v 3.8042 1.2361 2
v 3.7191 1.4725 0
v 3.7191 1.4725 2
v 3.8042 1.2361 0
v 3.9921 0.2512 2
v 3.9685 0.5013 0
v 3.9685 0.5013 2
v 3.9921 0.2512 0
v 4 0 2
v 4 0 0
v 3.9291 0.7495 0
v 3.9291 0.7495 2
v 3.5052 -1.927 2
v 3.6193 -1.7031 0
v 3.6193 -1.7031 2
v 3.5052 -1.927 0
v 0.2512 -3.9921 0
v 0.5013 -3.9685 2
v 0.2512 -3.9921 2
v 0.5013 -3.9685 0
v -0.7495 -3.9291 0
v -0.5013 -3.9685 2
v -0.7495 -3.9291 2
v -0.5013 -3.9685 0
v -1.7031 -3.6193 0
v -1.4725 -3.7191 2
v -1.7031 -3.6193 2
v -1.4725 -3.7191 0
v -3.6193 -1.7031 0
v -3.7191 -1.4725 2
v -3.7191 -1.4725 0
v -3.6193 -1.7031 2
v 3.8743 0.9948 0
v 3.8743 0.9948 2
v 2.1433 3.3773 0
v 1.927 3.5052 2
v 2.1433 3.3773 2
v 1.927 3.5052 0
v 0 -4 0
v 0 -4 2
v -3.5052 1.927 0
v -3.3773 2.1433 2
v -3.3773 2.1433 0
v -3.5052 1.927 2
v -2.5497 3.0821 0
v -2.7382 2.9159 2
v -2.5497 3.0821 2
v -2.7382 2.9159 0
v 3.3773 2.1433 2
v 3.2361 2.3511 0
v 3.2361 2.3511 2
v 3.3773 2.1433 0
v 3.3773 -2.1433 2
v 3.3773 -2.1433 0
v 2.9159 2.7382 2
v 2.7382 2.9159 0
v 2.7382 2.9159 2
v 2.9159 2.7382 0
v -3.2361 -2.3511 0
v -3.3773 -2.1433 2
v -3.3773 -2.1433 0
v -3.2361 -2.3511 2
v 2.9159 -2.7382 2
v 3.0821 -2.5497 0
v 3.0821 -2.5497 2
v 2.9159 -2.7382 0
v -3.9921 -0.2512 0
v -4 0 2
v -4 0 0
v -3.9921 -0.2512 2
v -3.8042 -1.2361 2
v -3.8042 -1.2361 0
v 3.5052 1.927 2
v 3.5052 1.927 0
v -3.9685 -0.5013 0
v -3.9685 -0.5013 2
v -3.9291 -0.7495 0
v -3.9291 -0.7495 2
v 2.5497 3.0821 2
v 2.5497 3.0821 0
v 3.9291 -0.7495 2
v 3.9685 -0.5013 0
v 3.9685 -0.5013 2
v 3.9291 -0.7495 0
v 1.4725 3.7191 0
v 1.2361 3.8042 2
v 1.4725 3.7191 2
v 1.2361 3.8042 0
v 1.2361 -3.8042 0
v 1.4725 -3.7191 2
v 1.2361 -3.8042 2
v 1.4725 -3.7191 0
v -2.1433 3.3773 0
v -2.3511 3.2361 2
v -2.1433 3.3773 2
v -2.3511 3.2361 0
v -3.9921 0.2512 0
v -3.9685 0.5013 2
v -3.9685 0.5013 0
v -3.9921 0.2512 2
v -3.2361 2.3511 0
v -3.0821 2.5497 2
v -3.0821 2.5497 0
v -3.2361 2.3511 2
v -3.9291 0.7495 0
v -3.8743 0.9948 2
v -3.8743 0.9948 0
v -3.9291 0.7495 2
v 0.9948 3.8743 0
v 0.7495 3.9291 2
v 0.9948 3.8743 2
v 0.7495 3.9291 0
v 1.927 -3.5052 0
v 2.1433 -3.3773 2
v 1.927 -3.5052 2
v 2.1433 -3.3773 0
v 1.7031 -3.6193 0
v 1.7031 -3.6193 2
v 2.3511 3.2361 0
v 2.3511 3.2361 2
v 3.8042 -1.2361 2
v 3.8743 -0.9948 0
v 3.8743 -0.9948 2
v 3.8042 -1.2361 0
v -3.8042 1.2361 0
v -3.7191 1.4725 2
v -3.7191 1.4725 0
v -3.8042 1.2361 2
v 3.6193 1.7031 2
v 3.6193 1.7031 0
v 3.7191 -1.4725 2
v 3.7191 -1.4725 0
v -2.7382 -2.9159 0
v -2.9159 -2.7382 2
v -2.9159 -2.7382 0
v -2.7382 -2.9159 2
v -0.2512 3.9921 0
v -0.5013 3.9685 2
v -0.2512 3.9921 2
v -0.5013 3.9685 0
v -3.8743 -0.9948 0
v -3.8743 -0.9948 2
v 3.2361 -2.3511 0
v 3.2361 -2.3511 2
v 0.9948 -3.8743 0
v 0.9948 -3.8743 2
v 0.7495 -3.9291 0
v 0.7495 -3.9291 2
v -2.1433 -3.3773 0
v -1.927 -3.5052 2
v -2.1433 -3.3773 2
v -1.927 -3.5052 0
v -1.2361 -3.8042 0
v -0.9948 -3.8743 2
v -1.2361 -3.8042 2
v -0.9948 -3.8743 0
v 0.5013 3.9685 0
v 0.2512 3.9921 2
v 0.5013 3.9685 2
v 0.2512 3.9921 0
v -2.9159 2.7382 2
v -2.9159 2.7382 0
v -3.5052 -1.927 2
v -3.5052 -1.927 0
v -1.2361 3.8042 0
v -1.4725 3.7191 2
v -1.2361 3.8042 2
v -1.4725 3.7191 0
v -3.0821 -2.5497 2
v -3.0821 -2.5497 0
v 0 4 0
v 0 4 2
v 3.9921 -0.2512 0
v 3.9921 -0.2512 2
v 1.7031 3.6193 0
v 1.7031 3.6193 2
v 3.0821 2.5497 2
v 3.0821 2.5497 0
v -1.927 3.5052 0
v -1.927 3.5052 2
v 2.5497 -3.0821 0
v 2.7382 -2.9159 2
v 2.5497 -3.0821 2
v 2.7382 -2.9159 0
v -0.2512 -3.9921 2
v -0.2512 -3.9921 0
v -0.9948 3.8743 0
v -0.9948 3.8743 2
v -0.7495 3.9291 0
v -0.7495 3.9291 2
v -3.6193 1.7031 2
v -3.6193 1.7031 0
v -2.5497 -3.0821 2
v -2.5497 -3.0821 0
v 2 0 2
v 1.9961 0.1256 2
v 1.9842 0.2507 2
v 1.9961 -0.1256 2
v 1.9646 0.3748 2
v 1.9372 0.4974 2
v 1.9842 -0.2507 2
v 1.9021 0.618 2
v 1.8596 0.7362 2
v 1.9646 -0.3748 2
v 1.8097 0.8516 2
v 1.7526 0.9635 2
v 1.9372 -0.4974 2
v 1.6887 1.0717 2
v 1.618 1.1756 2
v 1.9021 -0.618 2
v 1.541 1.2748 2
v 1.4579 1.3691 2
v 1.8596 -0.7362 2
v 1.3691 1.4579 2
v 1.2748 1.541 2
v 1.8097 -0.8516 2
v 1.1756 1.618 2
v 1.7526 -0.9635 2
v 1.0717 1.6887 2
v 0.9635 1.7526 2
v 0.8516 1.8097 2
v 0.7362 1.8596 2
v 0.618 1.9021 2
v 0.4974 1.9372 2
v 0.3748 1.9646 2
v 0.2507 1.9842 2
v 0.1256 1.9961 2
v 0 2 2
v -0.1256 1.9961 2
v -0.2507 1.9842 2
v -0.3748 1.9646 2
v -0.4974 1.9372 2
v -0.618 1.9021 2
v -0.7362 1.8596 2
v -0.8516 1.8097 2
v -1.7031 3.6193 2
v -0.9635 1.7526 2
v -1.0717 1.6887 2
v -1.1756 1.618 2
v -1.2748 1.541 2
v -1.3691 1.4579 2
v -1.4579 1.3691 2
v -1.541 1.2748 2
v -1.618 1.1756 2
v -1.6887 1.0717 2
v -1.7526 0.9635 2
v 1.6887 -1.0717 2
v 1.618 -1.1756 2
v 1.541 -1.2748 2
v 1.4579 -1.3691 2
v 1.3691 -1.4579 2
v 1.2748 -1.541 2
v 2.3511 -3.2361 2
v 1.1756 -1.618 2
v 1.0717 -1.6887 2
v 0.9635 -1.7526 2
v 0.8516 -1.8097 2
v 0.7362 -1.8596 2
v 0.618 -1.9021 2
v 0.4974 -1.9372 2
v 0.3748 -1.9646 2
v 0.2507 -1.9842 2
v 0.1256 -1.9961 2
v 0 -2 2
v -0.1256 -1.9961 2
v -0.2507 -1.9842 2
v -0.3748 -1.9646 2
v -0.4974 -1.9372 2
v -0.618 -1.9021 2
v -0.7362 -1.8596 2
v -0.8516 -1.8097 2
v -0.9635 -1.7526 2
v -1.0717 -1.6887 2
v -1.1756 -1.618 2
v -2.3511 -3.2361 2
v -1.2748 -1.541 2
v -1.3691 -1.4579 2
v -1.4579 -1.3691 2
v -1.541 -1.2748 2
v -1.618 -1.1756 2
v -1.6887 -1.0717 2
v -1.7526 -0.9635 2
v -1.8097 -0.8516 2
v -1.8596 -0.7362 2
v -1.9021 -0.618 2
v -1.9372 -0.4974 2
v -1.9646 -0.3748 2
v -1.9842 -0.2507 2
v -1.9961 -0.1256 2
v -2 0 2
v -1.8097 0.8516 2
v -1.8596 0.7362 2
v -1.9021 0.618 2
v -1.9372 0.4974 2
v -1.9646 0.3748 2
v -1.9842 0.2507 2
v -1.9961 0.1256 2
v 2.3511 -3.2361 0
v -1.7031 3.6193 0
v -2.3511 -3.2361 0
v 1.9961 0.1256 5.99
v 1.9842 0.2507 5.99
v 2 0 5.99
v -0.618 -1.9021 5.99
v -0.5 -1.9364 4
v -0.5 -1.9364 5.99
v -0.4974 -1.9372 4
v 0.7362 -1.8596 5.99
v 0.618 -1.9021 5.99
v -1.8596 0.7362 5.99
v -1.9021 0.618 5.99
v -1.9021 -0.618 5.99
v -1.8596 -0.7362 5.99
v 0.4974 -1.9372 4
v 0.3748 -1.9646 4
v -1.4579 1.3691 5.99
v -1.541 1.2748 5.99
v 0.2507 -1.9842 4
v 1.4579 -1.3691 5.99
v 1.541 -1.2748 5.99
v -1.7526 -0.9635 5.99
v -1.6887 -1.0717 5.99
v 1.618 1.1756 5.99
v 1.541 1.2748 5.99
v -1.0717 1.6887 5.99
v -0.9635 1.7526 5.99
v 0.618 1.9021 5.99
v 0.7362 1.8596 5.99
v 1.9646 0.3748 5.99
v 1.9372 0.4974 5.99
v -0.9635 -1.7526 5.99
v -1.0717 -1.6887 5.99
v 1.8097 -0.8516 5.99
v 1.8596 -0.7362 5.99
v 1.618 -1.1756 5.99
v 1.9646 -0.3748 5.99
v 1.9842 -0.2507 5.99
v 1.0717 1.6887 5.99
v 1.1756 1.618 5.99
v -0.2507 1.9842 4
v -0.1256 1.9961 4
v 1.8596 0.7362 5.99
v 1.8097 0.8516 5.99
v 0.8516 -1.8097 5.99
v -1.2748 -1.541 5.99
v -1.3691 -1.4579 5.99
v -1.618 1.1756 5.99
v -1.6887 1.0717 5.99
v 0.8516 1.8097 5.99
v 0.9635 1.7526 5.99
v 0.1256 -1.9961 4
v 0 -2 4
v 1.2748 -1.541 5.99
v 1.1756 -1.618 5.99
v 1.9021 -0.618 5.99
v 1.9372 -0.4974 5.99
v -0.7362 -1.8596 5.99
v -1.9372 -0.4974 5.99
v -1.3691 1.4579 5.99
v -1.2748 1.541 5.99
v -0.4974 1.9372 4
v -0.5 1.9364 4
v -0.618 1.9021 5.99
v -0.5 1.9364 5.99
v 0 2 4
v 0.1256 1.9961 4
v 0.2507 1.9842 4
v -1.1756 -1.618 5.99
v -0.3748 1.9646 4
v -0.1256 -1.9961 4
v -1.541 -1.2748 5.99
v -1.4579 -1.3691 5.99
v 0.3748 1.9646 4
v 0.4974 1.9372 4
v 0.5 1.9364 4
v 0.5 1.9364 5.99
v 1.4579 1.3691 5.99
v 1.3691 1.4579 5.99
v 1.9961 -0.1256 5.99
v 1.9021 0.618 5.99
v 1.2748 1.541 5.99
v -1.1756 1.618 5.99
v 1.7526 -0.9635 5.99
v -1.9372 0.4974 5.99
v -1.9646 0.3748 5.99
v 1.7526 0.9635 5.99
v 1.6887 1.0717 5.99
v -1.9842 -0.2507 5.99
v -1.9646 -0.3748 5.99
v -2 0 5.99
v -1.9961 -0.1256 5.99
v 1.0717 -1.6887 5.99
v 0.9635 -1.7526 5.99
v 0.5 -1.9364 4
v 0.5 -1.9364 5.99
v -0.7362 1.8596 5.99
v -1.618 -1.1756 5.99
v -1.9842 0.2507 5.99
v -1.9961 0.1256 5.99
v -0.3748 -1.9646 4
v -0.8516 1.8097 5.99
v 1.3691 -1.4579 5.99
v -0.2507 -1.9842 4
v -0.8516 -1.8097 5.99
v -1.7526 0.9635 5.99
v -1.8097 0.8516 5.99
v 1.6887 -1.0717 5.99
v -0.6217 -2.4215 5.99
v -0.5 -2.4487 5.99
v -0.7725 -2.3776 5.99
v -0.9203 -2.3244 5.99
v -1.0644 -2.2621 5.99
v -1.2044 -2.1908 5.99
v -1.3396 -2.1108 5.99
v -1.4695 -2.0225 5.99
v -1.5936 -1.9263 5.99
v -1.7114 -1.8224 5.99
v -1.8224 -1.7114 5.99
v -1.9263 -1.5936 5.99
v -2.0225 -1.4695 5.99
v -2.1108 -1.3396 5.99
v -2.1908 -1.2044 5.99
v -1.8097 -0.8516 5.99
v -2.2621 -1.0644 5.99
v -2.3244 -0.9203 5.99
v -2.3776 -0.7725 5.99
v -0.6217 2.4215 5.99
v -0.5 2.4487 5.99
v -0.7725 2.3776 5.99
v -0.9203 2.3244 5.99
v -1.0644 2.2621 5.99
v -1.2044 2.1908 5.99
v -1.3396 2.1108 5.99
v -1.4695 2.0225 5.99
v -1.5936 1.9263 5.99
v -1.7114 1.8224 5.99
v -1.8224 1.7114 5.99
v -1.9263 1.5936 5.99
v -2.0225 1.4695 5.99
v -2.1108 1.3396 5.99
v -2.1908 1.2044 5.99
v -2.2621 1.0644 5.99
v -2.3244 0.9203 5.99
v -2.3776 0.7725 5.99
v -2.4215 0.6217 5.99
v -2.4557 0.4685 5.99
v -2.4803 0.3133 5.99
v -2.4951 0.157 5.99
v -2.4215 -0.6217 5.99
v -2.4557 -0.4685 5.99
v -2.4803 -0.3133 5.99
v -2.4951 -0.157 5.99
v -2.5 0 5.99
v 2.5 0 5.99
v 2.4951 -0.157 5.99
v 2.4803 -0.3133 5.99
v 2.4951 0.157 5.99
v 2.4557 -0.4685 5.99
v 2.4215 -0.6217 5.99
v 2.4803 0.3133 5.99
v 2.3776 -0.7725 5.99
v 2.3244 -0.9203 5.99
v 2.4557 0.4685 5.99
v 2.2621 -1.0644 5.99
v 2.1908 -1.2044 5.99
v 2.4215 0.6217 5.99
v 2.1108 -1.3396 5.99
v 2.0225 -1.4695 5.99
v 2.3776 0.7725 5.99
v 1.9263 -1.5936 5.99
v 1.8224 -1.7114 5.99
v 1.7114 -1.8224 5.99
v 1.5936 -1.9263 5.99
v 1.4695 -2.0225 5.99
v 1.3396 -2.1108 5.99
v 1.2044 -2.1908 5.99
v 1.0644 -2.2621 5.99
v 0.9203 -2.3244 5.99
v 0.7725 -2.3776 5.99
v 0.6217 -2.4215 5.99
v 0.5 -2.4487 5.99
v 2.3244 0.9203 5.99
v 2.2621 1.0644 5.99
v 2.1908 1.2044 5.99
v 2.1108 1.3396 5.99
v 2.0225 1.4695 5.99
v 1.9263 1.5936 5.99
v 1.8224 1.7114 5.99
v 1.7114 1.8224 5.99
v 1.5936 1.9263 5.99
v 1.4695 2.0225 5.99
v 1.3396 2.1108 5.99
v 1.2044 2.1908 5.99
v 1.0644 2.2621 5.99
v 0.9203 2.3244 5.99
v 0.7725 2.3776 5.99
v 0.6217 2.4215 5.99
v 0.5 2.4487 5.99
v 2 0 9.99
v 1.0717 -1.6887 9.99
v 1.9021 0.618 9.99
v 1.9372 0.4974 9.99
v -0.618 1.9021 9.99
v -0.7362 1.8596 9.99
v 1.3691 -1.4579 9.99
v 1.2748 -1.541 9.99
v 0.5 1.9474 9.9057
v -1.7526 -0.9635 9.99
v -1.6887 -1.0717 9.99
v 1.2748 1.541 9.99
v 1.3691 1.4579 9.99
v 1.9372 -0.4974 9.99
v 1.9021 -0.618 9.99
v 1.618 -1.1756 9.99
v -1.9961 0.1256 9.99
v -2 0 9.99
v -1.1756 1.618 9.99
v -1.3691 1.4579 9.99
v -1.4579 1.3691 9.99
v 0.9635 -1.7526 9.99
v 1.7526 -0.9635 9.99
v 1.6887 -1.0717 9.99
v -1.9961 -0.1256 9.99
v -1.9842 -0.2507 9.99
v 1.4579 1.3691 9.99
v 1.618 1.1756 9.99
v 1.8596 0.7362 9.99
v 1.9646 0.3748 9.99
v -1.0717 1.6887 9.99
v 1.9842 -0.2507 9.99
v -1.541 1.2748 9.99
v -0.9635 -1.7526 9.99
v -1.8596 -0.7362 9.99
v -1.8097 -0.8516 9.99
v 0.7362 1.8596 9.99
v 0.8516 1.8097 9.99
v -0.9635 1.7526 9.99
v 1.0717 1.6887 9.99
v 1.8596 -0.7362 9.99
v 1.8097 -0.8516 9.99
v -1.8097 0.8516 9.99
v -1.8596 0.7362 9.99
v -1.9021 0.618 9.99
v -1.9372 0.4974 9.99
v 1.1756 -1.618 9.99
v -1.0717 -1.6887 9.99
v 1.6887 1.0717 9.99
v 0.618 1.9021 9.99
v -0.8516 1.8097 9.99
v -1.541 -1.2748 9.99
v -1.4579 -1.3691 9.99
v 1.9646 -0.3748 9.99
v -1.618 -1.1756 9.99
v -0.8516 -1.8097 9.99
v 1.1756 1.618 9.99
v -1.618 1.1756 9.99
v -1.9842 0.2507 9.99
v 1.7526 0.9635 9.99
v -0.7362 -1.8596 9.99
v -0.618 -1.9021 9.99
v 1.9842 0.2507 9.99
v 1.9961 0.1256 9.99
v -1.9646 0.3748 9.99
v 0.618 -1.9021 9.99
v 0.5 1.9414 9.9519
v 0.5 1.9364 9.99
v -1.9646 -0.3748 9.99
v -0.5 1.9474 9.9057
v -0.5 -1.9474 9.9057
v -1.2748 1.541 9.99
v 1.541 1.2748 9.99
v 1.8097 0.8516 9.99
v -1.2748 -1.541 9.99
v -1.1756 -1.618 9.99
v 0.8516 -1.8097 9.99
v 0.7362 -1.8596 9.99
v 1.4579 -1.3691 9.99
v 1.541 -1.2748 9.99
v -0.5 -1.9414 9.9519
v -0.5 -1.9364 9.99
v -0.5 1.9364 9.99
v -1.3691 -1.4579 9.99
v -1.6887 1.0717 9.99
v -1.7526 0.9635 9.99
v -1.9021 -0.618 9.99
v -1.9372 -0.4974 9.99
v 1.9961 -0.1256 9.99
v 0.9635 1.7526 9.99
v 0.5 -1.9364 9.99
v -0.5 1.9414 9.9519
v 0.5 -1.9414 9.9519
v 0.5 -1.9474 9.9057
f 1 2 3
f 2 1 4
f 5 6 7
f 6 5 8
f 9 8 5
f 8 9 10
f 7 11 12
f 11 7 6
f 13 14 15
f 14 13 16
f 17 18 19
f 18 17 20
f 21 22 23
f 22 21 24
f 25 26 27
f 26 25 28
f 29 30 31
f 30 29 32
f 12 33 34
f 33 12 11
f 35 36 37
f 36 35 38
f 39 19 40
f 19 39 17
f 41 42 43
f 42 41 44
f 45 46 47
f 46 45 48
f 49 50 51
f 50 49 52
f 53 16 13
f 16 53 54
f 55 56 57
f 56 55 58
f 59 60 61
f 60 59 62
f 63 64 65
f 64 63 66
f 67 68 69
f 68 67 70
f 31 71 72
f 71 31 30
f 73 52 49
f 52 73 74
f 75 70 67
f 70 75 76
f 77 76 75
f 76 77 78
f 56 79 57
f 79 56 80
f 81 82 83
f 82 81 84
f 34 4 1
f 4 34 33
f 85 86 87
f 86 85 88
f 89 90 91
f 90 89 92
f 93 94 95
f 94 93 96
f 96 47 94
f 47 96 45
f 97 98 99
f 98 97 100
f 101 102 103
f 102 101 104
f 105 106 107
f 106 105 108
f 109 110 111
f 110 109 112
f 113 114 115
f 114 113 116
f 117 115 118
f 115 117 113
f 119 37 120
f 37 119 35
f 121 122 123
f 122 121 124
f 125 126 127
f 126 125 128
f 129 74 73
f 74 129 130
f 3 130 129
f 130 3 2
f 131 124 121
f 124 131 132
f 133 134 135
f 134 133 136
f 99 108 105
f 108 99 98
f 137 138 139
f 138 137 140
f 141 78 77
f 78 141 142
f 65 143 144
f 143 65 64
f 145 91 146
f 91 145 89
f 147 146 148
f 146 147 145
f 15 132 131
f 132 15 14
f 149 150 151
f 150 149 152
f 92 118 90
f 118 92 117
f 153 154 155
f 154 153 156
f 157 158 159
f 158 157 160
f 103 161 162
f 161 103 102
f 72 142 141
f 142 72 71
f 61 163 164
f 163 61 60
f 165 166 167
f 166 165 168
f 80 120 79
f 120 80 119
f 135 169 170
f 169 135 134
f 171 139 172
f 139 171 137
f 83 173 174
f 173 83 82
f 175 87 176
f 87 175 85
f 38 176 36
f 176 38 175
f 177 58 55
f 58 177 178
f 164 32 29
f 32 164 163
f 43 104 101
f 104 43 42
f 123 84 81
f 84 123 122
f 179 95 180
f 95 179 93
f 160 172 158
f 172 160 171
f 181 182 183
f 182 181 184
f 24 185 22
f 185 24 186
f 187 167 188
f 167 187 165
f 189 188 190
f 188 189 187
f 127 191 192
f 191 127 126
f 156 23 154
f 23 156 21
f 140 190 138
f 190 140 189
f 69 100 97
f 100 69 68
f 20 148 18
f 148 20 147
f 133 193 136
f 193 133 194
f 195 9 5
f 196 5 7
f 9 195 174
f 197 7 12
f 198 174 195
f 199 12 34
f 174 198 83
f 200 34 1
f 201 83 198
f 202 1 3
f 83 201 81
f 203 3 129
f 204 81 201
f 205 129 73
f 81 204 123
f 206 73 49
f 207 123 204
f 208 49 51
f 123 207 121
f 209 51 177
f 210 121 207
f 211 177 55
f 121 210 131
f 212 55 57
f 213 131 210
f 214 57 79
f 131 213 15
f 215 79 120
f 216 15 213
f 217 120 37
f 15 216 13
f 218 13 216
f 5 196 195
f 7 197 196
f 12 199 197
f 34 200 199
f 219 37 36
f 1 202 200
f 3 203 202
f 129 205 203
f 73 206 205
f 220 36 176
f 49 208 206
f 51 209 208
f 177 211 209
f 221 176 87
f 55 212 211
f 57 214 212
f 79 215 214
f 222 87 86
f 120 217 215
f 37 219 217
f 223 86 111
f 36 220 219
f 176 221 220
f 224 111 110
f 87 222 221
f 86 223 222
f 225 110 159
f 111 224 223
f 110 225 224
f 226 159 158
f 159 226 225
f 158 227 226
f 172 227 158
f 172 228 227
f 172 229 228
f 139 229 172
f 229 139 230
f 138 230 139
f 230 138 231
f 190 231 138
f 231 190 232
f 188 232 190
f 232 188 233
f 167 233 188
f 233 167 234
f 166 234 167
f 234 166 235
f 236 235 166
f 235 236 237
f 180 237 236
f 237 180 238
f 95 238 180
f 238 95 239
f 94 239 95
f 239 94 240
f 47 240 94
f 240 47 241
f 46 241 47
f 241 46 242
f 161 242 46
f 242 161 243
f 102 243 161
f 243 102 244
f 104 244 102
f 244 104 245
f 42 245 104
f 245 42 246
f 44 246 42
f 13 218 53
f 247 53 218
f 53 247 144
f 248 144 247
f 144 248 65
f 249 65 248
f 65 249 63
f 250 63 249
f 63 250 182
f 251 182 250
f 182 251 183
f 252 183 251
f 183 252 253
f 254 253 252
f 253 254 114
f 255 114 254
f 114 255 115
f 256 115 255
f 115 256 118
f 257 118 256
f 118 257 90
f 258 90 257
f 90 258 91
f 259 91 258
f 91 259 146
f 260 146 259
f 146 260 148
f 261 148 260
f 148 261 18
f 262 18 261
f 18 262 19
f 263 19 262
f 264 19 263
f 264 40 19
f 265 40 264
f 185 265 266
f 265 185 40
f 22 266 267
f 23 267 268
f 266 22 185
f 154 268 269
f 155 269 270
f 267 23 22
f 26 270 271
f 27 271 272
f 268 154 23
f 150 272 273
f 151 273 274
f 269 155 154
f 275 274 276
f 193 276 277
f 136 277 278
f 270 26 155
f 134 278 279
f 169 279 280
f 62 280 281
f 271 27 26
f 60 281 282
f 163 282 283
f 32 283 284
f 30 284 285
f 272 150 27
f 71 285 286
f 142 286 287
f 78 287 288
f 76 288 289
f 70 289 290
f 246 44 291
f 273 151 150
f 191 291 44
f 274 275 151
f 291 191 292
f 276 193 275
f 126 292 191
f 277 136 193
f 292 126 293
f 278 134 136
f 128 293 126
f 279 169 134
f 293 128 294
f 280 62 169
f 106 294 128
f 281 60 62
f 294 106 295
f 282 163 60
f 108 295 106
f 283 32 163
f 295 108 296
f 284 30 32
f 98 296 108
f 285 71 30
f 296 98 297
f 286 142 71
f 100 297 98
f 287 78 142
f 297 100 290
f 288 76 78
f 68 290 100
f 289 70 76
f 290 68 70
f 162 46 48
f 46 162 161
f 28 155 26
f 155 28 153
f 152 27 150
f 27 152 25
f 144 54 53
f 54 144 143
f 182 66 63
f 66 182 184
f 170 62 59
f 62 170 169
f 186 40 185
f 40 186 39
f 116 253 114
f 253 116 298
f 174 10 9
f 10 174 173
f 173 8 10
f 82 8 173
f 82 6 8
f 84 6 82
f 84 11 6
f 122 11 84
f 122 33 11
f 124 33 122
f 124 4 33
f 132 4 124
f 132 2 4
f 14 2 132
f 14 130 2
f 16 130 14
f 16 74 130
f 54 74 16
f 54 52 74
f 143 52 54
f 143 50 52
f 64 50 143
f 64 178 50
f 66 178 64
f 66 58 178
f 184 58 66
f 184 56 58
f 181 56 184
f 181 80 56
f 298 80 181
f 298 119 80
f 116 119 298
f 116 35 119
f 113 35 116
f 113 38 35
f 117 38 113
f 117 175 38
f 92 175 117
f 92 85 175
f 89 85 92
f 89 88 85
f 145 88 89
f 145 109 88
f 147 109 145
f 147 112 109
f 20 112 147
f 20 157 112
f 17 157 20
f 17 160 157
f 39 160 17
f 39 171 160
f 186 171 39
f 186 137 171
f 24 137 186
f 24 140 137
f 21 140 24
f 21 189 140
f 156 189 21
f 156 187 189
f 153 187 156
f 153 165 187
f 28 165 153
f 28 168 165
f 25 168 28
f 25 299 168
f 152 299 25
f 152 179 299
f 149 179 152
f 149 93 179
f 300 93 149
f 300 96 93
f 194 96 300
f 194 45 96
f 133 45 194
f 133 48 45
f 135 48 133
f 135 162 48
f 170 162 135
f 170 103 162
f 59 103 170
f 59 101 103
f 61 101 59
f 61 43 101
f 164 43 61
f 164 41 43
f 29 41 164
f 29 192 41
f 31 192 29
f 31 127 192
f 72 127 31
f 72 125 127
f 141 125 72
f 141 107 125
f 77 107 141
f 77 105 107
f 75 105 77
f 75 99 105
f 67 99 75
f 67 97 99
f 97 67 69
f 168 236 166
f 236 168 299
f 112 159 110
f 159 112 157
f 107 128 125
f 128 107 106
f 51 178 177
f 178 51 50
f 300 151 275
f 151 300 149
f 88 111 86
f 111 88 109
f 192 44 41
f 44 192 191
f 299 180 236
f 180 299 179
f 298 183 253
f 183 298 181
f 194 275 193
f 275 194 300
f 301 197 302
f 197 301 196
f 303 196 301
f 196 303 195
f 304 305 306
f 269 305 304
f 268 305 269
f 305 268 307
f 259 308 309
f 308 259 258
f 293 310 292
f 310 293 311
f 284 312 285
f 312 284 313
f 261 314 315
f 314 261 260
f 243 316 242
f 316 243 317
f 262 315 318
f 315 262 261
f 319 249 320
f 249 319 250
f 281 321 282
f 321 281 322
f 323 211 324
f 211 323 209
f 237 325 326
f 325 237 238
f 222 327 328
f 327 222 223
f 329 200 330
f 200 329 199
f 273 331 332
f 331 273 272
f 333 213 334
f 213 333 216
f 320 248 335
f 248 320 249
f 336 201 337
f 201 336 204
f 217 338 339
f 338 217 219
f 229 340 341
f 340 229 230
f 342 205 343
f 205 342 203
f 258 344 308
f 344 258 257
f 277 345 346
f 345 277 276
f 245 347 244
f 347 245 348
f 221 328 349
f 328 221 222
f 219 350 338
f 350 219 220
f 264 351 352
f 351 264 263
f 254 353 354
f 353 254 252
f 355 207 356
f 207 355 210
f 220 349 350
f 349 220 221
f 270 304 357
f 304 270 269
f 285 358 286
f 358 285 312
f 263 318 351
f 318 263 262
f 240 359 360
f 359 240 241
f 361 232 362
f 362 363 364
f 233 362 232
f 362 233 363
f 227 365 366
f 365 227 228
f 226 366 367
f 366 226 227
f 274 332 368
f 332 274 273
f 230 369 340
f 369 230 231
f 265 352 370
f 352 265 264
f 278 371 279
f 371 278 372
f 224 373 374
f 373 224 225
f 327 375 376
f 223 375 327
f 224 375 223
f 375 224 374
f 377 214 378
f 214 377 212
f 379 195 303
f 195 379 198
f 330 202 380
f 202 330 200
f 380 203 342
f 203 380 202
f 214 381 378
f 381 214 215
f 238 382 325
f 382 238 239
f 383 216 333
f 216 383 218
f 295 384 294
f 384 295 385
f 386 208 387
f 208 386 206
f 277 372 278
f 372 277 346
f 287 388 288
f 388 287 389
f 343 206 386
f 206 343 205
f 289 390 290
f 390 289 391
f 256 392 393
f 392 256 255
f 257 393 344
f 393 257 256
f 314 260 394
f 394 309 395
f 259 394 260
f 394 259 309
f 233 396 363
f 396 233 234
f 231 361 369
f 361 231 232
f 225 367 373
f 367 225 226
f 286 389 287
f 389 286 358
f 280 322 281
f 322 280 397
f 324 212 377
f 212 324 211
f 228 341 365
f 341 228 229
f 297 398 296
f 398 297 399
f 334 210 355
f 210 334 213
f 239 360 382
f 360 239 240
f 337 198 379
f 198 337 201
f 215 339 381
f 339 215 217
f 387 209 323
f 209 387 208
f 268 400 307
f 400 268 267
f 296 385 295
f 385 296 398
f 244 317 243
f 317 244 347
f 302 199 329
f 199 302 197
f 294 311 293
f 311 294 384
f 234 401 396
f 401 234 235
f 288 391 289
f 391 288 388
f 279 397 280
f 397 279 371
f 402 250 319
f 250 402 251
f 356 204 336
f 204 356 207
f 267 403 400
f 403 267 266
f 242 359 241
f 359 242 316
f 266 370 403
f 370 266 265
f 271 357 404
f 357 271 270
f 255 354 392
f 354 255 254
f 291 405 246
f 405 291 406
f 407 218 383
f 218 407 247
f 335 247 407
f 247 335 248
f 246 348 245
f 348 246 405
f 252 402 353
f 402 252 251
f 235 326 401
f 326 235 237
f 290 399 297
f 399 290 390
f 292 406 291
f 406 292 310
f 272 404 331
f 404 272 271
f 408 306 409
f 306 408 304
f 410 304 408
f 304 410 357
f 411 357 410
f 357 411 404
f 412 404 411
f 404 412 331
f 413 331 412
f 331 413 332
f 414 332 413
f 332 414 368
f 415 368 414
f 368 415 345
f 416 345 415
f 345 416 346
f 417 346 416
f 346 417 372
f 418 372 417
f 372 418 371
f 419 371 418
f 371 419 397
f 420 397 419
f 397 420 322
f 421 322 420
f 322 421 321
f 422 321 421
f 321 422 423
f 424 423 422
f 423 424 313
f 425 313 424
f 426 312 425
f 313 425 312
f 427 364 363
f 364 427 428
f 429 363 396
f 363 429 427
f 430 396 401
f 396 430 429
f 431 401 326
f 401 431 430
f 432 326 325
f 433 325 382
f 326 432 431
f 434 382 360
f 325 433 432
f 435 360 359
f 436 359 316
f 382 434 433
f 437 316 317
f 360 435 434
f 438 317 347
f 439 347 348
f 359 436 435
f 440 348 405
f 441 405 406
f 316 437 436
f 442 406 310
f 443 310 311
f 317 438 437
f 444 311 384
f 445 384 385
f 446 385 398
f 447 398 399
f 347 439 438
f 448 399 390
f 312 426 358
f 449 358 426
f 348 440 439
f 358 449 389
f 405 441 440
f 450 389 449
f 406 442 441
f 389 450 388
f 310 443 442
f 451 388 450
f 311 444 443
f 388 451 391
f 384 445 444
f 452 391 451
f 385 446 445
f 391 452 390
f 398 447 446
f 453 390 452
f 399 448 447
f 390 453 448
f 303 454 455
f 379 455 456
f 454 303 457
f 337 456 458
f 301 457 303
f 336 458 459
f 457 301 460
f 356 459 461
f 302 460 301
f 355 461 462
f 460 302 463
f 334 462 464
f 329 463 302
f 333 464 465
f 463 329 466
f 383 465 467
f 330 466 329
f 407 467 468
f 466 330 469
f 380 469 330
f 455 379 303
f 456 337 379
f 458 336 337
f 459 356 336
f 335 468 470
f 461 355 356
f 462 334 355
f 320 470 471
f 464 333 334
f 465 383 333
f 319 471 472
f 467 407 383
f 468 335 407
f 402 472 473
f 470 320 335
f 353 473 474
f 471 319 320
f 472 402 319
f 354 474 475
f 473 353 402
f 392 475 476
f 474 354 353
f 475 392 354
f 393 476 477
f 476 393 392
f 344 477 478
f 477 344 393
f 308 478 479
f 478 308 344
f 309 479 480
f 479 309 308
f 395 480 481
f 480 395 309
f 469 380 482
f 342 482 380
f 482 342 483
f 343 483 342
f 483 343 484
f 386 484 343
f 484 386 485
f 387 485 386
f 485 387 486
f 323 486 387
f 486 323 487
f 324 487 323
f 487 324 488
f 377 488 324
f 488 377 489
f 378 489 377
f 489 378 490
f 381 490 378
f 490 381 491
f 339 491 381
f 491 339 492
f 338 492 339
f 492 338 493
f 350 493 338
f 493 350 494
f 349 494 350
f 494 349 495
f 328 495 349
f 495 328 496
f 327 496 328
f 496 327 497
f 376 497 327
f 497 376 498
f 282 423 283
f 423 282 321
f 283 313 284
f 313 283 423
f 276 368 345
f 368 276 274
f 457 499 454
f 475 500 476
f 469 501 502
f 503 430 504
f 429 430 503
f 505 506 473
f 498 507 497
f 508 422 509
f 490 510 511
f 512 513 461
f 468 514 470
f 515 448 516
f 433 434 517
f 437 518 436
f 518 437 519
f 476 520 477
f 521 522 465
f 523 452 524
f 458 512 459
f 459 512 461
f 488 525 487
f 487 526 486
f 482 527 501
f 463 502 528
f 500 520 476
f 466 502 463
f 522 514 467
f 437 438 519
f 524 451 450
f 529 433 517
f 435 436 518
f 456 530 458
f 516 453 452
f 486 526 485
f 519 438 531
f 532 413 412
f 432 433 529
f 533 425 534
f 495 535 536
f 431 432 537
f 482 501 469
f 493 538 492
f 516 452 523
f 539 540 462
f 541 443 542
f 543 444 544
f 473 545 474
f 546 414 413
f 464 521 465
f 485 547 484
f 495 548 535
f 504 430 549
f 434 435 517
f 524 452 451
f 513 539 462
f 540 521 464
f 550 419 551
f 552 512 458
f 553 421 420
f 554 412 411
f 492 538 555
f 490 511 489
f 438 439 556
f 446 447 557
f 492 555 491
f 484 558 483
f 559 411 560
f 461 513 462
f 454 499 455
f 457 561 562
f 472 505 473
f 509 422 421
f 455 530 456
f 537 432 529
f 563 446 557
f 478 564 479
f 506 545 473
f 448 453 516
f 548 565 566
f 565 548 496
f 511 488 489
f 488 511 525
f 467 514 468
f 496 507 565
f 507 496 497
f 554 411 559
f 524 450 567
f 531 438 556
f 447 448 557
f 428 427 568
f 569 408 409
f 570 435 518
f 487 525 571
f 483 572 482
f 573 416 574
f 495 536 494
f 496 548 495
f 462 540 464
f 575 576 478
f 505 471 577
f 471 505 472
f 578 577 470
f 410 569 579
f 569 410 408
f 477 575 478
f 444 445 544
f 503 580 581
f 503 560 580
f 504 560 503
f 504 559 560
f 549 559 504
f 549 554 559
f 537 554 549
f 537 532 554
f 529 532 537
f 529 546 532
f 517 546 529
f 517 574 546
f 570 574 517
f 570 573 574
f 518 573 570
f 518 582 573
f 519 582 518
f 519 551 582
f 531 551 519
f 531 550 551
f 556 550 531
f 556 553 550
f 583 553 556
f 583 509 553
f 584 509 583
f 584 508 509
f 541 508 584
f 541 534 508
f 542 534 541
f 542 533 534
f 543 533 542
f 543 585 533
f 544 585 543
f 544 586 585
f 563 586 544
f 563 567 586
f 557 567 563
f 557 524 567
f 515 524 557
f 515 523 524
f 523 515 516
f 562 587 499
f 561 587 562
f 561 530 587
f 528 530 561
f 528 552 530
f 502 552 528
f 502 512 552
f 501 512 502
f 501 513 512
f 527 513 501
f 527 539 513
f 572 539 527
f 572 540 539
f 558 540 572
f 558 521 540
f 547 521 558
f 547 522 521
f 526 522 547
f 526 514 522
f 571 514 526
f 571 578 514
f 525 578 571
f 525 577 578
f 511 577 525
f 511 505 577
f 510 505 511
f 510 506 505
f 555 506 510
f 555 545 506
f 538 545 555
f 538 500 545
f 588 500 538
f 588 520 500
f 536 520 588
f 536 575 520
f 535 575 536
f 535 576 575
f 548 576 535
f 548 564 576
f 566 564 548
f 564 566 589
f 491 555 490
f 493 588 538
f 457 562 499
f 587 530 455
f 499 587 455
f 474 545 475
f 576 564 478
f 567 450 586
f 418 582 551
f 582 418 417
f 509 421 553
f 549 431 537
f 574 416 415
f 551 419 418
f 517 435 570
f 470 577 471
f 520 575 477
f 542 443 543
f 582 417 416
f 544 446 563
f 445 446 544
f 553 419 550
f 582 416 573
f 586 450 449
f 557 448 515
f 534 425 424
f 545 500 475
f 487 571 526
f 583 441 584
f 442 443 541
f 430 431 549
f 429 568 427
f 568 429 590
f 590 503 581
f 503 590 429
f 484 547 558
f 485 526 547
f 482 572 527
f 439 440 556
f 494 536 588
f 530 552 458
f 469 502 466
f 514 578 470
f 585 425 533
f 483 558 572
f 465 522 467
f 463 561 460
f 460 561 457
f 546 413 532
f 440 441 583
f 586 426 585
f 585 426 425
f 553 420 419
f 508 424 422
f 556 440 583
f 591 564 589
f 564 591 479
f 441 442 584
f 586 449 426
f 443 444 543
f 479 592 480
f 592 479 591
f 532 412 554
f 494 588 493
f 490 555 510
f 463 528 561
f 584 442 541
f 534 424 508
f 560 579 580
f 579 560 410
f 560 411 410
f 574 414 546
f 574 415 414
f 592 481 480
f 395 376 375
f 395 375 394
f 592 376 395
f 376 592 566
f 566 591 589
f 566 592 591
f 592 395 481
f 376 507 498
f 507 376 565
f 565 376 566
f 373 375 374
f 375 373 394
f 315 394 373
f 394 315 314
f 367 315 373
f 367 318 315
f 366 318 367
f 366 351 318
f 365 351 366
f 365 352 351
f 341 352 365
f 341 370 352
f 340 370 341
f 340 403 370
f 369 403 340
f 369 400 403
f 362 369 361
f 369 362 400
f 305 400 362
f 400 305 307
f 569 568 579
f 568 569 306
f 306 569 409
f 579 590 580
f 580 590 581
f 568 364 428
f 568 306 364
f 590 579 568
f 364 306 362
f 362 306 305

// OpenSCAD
// rivet.scad Customizable plastic rivet

$fn = 100;

/* Rivet dimensions */
Base_Dia      = 8;
Base_Length   = 2;

Shaft_Dia     = 4;
Shaft_Length  = 4;

Head_Dia      = 5;
Head_Length   = 4;

Slot_Width    = 1;
Slot_Height   = Base_Length + Shaft_Length/2;

m = 0.2;
difference() {
  union() {
    translate([0, 0, 0])
      cylinder(d=Base_Dia, h=Base_Length, center=false);

    translate([0, 0, Base_Length-0.01])
      cylinder(d=Shaft_Dia, h=Shaft_Length, center=false);

    translate([0, 0, Base_Length+Shaft_Length-0.01])
      cylinder(d1=Head_Dia, h=Head_Length, d2=Shaft_Dia);
  }
  translate([-Slot_Width/2,-25, Slot_Height])
    cube([Slot_Width,50,50]);
}      
